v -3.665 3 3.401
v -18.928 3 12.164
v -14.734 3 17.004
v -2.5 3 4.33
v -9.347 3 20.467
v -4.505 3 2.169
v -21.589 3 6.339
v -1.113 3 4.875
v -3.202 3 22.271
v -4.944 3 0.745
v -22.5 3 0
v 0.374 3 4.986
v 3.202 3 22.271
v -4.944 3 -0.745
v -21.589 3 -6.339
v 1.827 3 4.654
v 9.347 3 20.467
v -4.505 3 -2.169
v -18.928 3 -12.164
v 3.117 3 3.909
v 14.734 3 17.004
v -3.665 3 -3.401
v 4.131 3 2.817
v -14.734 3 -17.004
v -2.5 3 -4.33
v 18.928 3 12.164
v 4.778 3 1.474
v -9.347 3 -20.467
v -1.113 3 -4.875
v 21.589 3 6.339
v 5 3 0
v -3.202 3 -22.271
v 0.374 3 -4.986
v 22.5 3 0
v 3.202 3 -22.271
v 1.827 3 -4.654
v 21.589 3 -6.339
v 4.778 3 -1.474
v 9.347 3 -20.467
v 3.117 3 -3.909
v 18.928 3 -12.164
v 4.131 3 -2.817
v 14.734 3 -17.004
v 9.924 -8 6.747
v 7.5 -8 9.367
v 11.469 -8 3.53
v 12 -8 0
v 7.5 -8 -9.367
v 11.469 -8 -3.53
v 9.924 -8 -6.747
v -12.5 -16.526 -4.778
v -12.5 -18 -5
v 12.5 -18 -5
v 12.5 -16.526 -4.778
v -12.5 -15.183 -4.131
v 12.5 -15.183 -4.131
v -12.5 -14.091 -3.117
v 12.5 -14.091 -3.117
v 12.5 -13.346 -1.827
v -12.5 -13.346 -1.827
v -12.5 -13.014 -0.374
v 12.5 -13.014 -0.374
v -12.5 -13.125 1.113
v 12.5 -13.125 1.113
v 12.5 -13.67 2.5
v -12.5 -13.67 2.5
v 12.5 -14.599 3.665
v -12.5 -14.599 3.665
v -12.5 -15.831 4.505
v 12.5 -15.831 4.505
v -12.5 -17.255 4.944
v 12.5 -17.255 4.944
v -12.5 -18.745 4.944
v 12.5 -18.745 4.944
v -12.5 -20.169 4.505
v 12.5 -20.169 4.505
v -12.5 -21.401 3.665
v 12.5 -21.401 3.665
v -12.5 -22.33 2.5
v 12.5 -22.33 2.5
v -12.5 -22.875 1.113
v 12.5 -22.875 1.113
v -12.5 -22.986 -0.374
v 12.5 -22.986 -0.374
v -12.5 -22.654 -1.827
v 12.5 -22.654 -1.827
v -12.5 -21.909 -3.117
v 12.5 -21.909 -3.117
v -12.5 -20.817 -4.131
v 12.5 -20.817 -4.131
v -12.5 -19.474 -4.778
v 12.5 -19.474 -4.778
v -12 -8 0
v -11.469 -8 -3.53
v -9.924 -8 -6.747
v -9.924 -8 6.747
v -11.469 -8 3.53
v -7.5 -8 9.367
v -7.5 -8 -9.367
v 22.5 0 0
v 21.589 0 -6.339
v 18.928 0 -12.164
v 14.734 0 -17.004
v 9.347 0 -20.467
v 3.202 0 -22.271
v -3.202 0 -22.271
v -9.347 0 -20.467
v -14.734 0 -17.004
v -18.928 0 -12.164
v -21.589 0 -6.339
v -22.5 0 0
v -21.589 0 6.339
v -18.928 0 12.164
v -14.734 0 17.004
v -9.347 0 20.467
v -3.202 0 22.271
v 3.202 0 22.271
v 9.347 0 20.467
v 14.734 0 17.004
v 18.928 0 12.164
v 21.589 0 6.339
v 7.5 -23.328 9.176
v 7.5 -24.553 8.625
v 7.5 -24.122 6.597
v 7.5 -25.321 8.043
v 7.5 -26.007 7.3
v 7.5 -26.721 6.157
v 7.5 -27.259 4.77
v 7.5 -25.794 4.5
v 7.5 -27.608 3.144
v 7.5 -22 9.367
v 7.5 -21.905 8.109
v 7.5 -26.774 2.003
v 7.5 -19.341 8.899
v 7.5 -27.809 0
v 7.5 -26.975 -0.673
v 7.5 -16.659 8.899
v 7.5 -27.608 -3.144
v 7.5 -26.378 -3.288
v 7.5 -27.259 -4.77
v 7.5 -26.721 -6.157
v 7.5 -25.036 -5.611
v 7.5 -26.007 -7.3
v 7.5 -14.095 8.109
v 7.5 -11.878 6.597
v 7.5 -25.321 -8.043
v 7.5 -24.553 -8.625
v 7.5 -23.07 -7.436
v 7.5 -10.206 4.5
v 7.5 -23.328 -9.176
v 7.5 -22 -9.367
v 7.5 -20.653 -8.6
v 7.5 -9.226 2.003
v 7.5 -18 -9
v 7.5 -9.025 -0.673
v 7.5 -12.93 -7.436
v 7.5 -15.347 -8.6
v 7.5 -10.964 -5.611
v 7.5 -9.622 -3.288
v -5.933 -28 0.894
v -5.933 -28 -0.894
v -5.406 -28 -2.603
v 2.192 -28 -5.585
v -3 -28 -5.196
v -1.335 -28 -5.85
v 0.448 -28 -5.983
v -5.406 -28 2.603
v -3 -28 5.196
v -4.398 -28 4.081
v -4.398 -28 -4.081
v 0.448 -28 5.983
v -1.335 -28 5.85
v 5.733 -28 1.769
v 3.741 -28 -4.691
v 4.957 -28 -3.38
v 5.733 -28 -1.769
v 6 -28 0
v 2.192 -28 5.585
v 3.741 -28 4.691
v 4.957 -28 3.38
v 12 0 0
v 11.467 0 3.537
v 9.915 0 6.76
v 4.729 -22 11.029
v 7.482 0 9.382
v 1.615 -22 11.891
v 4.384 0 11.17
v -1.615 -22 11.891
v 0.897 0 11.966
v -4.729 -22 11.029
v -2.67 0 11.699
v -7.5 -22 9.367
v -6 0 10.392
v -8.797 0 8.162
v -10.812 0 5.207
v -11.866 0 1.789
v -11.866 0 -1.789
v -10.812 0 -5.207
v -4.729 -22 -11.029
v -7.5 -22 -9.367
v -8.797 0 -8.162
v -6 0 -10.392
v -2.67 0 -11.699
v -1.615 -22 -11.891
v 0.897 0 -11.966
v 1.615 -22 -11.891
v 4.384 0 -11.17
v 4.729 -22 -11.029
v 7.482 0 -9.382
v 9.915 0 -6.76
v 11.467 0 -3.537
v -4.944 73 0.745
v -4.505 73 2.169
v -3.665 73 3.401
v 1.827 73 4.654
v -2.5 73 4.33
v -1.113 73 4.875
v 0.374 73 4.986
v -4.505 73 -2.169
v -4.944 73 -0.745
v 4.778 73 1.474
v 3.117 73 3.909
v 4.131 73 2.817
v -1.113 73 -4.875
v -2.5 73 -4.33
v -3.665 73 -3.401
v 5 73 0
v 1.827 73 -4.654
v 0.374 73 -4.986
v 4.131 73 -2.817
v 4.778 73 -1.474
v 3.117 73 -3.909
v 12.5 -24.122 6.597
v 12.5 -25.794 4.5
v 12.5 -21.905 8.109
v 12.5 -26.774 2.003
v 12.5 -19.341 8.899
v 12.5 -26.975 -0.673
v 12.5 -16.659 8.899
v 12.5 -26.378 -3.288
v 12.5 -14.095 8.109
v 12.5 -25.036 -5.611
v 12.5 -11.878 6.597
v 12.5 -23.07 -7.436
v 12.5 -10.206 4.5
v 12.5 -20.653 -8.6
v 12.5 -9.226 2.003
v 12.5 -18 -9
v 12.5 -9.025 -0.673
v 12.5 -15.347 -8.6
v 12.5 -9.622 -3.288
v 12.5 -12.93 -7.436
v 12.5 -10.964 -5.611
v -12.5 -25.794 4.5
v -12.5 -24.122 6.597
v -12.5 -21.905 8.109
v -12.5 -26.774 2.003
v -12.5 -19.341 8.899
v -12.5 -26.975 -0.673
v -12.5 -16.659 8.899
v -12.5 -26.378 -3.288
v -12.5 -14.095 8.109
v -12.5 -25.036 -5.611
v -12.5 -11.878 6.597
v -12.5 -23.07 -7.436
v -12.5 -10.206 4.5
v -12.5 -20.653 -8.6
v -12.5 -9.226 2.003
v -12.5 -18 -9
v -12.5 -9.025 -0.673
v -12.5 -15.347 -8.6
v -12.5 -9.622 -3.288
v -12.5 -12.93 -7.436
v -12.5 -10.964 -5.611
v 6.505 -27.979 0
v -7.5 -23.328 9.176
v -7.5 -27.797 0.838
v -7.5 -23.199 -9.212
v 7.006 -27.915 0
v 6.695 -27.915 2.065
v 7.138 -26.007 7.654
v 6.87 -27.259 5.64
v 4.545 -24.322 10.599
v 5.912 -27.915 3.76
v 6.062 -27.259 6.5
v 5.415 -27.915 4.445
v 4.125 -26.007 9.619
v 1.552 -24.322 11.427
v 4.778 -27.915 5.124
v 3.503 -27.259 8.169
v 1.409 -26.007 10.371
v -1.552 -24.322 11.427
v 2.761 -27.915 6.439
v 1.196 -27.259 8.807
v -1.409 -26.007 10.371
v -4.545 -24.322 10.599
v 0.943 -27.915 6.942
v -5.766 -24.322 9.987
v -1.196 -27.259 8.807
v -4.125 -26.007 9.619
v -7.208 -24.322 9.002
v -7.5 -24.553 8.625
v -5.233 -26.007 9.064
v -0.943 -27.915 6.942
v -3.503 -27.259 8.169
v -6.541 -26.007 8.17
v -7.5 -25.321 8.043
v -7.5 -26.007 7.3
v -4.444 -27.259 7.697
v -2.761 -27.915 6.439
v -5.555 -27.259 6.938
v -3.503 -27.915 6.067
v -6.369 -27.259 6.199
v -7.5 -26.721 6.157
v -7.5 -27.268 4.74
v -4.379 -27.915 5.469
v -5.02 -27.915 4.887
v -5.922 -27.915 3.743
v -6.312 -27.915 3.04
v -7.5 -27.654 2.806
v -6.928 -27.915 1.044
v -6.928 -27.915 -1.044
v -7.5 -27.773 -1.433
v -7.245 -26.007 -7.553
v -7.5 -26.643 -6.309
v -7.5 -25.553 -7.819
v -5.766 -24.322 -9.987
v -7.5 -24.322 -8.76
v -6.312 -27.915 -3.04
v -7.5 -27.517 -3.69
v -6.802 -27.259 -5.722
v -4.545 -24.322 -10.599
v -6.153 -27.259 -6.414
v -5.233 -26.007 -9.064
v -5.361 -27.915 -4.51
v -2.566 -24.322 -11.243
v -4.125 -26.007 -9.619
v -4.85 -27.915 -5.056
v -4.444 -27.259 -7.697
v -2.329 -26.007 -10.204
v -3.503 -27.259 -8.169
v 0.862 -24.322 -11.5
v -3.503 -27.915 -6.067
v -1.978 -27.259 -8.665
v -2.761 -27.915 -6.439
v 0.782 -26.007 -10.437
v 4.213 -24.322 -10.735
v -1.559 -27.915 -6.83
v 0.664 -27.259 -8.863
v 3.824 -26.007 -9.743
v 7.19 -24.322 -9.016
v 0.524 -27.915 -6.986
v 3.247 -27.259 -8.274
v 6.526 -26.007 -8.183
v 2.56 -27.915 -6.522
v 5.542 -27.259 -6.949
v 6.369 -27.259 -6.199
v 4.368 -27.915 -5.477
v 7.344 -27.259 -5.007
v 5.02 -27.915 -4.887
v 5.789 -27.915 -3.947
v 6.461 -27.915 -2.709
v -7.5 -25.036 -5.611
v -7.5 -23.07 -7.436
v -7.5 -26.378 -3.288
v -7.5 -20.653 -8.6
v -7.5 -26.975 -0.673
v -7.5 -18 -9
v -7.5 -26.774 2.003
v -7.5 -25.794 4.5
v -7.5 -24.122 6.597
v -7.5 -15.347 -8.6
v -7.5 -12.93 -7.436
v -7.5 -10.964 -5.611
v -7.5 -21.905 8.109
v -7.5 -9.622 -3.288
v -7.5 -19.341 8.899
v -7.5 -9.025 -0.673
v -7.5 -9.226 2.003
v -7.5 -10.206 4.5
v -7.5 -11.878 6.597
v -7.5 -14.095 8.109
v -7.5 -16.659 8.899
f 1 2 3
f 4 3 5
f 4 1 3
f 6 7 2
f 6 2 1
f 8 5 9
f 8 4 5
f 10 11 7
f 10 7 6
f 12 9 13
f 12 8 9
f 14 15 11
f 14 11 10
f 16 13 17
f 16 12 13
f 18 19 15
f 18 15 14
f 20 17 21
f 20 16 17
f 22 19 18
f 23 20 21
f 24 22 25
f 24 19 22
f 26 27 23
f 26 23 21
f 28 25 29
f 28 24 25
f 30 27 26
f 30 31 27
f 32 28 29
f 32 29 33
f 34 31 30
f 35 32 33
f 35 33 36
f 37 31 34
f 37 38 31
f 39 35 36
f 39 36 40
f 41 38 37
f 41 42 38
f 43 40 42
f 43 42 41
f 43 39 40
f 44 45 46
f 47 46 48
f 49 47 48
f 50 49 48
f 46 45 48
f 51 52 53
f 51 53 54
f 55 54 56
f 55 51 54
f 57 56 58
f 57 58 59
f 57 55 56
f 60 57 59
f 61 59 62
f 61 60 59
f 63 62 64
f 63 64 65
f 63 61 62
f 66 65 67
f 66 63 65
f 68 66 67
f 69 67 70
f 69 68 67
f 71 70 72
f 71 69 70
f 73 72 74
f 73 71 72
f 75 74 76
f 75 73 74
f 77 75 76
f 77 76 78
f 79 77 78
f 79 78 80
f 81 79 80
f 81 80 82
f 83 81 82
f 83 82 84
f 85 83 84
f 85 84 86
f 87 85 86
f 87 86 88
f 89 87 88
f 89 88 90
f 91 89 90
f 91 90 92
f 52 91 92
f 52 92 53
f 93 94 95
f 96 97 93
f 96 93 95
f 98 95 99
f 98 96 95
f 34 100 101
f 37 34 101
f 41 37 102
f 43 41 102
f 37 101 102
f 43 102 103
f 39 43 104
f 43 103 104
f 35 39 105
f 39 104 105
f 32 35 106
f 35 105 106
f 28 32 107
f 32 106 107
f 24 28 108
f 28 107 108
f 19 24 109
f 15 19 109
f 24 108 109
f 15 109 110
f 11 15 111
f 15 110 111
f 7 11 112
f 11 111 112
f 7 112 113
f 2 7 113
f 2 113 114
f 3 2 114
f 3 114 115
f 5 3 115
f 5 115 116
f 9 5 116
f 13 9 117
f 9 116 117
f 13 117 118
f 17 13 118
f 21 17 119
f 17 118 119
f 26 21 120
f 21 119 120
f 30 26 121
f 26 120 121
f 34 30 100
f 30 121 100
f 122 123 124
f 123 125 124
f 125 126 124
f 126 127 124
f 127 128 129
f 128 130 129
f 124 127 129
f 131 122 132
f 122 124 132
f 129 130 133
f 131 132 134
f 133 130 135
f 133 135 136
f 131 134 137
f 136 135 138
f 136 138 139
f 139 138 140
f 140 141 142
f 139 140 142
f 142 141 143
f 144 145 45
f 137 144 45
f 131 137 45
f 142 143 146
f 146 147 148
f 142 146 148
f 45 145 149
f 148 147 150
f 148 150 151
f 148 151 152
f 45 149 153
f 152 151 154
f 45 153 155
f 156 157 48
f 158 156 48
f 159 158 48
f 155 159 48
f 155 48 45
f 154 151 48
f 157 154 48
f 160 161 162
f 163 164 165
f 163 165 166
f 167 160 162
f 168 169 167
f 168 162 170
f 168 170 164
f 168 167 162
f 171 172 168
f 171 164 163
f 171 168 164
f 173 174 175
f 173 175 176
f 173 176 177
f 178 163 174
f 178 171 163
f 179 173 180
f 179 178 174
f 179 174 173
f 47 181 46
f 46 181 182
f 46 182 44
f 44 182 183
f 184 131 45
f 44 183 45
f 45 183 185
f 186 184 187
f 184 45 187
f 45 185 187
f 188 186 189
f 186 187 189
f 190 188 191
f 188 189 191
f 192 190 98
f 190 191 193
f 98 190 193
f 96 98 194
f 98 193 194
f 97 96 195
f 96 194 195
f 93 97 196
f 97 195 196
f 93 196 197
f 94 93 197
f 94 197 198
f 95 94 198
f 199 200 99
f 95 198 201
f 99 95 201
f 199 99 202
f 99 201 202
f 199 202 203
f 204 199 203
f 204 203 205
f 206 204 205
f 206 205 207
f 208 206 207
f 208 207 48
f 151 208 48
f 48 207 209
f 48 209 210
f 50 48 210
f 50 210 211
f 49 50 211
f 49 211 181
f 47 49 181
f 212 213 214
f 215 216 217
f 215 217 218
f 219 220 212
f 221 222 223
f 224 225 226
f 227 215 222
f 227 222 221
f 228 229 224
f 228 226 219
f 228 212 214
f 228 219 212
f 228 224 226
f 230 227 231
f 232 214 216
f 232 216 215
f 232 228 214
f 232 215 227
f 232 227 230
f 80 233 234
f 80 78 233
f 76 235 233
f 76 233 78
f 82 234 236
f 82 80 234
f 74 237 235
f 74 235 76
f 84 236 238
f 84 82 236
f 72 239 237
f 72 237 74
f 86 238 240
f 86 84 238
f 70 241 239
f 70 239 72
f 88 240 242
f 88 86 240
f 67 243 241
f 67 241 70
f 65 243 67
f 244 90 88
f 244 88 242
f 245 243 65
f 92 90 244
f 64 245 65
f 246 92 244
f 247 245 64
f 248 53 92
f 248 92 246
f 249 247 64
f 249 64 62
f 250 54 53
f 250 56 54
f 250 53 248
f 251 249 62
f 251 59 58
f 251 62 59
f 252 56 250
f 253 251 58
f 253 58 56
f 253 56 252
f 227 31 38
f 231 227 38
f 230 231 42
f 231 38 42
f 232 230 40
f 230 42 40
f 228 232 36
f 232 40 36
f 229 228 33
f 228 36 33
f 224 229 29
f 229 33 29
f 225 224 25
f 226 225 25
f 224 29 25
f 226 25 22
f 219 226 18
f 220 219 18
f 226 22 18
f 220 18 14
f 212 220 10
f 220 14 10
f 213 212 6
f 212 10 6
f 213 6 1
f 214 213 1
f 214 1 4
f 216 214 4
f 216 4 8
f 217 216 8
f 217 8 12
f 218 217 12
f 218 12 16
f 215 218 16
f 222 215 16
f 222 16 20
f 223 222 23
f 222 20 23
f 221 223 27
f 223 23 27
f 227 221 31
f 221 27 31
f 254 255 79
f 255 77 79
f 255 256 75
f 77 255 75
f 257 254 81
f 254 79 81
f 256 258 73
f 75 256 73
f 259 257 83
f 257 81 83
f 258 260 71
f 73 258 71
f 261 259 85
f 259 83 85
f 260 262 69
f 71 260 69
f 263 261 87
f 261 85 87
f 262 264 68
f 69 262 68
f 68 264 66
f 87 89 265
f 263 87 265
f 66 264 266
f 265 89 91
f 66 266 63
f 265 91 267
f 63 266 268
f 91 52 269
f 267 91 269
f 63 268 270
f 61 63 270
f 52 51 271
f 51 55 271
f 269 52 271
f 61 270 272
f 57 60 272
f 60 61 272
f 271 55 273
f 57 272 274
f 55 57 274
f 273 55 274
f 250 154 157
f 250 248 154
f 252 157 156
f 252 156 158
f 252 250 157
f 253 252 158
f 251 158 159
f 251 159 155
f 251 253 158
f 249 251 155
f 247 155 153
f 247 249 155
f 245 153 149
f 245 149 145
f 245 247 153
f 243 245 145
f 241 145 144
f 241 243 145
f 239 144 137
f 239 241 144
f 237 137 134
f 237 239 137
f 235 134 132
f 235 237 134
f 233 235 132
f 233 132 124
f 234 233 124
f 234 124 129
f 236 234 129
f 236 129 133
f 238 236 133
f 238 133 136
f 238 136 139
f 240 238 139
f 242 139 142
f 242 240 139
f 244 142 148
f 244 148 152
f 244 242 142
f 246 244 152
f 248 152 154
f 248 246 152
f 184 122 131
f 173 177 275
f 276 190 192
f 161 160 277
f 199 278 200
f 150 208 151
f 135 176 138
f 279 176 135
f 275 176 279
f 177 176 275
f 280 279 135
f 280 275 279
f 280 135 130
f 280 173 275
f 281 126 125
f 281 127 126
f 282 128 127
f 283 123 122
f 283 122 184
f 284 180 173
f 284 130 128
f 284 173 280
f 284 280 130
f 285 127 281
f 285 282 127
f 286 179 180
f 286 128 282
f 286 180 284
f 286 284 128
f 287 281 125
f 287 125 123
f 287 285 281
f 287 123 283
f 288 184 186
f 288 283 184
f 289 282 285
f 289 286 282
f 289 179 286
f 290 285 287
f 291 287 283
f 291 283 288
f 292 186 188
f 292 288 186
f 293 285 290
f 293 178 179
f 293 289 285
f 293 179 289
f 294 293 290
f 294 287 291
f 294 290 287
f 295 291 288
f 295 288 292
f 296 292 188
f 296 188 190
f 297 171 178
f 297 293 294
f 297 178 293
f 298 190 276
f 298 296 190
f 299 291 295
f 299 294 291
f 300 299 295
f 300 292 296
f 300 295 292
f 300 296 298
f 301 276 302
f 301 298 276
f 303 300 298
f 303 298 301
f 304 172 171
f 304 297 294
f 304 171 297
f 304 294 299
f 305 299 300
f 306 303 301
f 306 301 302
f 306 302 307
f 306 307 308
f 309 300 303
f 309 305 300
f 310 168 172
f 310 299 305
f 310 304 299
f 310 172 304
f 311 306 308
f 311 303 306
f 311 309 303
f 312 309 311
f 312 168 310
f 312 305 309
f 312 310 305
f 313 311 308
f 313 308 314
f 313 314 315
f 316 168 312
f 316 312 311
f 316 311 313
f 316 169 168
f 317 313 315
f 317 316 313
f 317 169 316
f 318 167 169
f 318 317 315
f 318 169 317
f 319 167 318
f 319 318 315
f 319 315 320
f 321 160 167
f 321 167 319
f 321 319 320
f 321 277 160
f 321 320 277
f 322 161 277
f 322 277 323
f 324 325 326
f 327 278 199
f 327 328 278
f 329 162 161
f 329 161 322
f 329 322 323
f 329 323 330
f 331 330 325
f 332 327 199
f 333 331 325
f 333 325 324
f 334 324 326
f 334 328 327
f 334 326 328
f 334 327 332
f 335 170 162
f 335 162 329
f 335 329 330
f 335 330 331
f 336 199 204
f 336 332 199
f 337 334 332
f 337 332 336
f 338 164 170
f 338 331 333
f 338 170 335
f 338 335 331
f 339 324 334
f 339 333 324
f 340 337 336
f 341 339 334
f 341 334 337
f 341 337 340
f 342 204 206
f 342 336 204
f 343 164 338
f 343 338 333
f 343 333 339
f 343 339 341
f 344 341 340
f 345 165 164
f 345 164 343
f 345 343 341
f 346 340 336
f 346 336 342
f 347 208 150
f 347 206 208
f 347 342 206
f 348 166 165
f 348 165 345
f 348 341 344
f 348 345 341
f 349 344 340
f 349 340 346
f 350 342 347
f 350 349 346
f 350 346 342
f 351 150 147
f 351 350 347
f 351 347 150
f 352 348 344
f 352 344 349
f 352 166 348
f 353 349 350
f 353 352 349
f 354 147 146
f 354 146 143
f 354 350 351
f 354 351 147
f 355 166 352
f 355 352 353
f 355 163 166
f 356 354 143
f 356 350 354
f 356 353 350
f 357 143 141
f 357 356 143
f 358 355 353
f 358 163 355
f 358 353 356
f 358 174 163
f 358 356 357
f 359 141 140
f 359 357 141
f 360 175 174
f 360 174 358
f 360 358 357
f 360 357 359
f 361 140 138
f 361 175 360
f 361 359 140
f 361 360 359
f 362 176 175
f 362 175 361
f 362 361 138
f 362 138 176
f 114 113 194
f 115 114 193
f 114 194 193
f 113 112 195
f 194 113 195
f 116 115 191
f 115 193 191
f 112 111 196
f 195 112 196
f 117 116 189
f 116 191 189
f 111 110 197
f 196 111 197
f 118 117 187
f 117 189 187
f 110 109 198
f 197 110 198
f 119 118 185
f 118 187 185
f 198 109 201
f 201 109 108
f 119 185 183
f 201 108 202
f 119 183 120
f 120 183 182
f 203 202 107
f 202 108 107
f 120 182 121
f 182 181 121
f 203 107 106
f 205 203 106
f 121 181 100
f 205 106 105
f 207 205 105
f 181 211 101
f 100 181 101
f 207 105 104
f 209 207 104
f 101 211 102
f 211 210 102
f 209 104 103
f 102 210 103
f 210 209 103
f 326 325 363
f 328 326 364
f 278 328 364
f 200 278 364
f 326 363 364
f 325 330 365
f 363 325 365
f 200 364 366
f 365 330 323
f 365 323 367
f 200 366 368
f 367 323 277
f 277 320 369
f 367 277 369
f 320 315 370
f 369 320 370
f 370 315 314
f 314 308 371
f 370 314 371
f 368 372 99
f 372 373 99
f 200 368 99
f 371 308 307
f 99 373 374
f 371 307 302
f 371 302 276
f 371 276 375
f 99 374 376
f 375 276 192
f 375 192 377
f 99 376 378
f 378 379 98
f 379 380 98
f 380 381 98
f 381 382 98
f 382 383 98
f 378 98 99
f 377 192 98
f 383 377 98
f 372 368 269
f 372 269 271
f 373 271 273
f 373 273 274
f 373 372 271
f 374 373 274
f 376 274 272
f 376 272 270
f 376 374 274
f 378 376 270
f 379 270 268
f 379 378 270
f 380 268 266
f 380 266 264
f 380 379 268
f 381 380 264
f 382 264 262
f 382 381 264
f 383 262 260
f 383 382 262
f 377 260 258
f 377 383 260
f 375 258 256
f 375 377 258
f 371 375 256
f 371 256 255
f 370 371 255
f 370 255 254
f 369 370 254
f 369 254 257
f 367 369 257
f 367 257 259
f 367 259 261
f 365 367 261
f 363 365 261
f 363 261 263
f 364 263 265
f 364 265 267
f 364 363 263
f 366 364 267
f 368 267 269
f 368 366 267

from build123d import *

# Parameters (mm, degrees)
SKETCH1_R           = 22.5
BOSS_EXTRUDE1_DEPTH = 3
SKETCH2_R           = 5
BOSS_EXTRUDE2_DEPTH = 70
SKETCH3_R           = 12
BOSS_EXTRUDE3_DEPTH = 28
FILLET1_R           = 6
SKETCH4_W           = 20
SKETCH4_H           = 20
CUT_EXTRUDE1_DEPTH  = 14
SKETCH6_R           = 5
CUT_EXTRUDE2_DEPTH  = 31
SKETCH7_R           = 9
SKETCH7_R_2         = 5
BOSS_EXTRUDE4_DEPTH = 12.5


with BuildPart() as part:
    # Sketch1 → Boss-Extrude1 (new body)
    with BuildSketch(Plane(origin=(0, 0, 0), x_dir=(1, 0, 0), z_dir=(0, 1, 0))):
        Circle(SKETCH1_R)
    extrude(amount=BOSS_EXTRUDE1_DEPTH)

    # Sketch2 → Boss-Extrude2 (add)
    with BuildSketch(Plane(origin=(0, 3, 0), x_dir=(1, 0, 0), z_dir=(0, 1, 0))):
        Circle(SKETCH2_R)
    extrude(amount=BOSS_EXTRUDE2_DEPTH)

    # Sketch3 → Boss-Extrude3 (add)
    with BuildSketch(Plane.XZ):
        Circle(SKETCH3_R)
    extrude(amount=BOSS_EXTRUDE3_DEPTH)

    # Fillet1
    fillet1_edges = [part.edges().sort_by_distance(p)[0] for p in [
        (-12, -28, 0),
    ]]
    fillet(fillet1_edges, radius=FILLET1_R)

    # Sketch4 → Cut-Extrude1 (cut, symmetric)
    with BuildSketch(Plane.XY):
        with Locations((17.5, -18)):
            Rectangle(SKETCH4_W, SKETCH4_H)
        with Locations((-17.5, -18)):
            Rectangle(SKETCH4_W, SKETCH4_H)
    extrude(amount=CUT_EXTRUDE1_DEPTH, both=True, mode=Mode.SUBTRACT)

    # Sketch6 → Cut-Extrude2 (cut, through all)
    with BuildSketch(Plane(origin=(7.5, 0, 0), x_dir=(0, 0, -1), z_dir=(1, 0, 0))):
        with Locations((0, -18)):
            Circle(SKETCH6_R)
    extrude(amount=-CUT_EXTRUDE2_DEPTH, mode=Mode.SUBTRACT)

    # Sketch7 → Boss-Extrude4 (add, symmetric)
    with BuildSketch(Plane(origin=(0, 0, 0), x_dir=(0, 0, -1), z_dir=(1, 0, 0))):
        with Locations((0, -18)):
            Circle(SKETCH7_R)
        with Locations((0, -18)):
            Circle(SKETCH7_R_2, mode=Mode.SUBTRACT)
    extrude(amount=BOSS_EXTRUDE4_DEPTH, both=True)


solid = part.part
